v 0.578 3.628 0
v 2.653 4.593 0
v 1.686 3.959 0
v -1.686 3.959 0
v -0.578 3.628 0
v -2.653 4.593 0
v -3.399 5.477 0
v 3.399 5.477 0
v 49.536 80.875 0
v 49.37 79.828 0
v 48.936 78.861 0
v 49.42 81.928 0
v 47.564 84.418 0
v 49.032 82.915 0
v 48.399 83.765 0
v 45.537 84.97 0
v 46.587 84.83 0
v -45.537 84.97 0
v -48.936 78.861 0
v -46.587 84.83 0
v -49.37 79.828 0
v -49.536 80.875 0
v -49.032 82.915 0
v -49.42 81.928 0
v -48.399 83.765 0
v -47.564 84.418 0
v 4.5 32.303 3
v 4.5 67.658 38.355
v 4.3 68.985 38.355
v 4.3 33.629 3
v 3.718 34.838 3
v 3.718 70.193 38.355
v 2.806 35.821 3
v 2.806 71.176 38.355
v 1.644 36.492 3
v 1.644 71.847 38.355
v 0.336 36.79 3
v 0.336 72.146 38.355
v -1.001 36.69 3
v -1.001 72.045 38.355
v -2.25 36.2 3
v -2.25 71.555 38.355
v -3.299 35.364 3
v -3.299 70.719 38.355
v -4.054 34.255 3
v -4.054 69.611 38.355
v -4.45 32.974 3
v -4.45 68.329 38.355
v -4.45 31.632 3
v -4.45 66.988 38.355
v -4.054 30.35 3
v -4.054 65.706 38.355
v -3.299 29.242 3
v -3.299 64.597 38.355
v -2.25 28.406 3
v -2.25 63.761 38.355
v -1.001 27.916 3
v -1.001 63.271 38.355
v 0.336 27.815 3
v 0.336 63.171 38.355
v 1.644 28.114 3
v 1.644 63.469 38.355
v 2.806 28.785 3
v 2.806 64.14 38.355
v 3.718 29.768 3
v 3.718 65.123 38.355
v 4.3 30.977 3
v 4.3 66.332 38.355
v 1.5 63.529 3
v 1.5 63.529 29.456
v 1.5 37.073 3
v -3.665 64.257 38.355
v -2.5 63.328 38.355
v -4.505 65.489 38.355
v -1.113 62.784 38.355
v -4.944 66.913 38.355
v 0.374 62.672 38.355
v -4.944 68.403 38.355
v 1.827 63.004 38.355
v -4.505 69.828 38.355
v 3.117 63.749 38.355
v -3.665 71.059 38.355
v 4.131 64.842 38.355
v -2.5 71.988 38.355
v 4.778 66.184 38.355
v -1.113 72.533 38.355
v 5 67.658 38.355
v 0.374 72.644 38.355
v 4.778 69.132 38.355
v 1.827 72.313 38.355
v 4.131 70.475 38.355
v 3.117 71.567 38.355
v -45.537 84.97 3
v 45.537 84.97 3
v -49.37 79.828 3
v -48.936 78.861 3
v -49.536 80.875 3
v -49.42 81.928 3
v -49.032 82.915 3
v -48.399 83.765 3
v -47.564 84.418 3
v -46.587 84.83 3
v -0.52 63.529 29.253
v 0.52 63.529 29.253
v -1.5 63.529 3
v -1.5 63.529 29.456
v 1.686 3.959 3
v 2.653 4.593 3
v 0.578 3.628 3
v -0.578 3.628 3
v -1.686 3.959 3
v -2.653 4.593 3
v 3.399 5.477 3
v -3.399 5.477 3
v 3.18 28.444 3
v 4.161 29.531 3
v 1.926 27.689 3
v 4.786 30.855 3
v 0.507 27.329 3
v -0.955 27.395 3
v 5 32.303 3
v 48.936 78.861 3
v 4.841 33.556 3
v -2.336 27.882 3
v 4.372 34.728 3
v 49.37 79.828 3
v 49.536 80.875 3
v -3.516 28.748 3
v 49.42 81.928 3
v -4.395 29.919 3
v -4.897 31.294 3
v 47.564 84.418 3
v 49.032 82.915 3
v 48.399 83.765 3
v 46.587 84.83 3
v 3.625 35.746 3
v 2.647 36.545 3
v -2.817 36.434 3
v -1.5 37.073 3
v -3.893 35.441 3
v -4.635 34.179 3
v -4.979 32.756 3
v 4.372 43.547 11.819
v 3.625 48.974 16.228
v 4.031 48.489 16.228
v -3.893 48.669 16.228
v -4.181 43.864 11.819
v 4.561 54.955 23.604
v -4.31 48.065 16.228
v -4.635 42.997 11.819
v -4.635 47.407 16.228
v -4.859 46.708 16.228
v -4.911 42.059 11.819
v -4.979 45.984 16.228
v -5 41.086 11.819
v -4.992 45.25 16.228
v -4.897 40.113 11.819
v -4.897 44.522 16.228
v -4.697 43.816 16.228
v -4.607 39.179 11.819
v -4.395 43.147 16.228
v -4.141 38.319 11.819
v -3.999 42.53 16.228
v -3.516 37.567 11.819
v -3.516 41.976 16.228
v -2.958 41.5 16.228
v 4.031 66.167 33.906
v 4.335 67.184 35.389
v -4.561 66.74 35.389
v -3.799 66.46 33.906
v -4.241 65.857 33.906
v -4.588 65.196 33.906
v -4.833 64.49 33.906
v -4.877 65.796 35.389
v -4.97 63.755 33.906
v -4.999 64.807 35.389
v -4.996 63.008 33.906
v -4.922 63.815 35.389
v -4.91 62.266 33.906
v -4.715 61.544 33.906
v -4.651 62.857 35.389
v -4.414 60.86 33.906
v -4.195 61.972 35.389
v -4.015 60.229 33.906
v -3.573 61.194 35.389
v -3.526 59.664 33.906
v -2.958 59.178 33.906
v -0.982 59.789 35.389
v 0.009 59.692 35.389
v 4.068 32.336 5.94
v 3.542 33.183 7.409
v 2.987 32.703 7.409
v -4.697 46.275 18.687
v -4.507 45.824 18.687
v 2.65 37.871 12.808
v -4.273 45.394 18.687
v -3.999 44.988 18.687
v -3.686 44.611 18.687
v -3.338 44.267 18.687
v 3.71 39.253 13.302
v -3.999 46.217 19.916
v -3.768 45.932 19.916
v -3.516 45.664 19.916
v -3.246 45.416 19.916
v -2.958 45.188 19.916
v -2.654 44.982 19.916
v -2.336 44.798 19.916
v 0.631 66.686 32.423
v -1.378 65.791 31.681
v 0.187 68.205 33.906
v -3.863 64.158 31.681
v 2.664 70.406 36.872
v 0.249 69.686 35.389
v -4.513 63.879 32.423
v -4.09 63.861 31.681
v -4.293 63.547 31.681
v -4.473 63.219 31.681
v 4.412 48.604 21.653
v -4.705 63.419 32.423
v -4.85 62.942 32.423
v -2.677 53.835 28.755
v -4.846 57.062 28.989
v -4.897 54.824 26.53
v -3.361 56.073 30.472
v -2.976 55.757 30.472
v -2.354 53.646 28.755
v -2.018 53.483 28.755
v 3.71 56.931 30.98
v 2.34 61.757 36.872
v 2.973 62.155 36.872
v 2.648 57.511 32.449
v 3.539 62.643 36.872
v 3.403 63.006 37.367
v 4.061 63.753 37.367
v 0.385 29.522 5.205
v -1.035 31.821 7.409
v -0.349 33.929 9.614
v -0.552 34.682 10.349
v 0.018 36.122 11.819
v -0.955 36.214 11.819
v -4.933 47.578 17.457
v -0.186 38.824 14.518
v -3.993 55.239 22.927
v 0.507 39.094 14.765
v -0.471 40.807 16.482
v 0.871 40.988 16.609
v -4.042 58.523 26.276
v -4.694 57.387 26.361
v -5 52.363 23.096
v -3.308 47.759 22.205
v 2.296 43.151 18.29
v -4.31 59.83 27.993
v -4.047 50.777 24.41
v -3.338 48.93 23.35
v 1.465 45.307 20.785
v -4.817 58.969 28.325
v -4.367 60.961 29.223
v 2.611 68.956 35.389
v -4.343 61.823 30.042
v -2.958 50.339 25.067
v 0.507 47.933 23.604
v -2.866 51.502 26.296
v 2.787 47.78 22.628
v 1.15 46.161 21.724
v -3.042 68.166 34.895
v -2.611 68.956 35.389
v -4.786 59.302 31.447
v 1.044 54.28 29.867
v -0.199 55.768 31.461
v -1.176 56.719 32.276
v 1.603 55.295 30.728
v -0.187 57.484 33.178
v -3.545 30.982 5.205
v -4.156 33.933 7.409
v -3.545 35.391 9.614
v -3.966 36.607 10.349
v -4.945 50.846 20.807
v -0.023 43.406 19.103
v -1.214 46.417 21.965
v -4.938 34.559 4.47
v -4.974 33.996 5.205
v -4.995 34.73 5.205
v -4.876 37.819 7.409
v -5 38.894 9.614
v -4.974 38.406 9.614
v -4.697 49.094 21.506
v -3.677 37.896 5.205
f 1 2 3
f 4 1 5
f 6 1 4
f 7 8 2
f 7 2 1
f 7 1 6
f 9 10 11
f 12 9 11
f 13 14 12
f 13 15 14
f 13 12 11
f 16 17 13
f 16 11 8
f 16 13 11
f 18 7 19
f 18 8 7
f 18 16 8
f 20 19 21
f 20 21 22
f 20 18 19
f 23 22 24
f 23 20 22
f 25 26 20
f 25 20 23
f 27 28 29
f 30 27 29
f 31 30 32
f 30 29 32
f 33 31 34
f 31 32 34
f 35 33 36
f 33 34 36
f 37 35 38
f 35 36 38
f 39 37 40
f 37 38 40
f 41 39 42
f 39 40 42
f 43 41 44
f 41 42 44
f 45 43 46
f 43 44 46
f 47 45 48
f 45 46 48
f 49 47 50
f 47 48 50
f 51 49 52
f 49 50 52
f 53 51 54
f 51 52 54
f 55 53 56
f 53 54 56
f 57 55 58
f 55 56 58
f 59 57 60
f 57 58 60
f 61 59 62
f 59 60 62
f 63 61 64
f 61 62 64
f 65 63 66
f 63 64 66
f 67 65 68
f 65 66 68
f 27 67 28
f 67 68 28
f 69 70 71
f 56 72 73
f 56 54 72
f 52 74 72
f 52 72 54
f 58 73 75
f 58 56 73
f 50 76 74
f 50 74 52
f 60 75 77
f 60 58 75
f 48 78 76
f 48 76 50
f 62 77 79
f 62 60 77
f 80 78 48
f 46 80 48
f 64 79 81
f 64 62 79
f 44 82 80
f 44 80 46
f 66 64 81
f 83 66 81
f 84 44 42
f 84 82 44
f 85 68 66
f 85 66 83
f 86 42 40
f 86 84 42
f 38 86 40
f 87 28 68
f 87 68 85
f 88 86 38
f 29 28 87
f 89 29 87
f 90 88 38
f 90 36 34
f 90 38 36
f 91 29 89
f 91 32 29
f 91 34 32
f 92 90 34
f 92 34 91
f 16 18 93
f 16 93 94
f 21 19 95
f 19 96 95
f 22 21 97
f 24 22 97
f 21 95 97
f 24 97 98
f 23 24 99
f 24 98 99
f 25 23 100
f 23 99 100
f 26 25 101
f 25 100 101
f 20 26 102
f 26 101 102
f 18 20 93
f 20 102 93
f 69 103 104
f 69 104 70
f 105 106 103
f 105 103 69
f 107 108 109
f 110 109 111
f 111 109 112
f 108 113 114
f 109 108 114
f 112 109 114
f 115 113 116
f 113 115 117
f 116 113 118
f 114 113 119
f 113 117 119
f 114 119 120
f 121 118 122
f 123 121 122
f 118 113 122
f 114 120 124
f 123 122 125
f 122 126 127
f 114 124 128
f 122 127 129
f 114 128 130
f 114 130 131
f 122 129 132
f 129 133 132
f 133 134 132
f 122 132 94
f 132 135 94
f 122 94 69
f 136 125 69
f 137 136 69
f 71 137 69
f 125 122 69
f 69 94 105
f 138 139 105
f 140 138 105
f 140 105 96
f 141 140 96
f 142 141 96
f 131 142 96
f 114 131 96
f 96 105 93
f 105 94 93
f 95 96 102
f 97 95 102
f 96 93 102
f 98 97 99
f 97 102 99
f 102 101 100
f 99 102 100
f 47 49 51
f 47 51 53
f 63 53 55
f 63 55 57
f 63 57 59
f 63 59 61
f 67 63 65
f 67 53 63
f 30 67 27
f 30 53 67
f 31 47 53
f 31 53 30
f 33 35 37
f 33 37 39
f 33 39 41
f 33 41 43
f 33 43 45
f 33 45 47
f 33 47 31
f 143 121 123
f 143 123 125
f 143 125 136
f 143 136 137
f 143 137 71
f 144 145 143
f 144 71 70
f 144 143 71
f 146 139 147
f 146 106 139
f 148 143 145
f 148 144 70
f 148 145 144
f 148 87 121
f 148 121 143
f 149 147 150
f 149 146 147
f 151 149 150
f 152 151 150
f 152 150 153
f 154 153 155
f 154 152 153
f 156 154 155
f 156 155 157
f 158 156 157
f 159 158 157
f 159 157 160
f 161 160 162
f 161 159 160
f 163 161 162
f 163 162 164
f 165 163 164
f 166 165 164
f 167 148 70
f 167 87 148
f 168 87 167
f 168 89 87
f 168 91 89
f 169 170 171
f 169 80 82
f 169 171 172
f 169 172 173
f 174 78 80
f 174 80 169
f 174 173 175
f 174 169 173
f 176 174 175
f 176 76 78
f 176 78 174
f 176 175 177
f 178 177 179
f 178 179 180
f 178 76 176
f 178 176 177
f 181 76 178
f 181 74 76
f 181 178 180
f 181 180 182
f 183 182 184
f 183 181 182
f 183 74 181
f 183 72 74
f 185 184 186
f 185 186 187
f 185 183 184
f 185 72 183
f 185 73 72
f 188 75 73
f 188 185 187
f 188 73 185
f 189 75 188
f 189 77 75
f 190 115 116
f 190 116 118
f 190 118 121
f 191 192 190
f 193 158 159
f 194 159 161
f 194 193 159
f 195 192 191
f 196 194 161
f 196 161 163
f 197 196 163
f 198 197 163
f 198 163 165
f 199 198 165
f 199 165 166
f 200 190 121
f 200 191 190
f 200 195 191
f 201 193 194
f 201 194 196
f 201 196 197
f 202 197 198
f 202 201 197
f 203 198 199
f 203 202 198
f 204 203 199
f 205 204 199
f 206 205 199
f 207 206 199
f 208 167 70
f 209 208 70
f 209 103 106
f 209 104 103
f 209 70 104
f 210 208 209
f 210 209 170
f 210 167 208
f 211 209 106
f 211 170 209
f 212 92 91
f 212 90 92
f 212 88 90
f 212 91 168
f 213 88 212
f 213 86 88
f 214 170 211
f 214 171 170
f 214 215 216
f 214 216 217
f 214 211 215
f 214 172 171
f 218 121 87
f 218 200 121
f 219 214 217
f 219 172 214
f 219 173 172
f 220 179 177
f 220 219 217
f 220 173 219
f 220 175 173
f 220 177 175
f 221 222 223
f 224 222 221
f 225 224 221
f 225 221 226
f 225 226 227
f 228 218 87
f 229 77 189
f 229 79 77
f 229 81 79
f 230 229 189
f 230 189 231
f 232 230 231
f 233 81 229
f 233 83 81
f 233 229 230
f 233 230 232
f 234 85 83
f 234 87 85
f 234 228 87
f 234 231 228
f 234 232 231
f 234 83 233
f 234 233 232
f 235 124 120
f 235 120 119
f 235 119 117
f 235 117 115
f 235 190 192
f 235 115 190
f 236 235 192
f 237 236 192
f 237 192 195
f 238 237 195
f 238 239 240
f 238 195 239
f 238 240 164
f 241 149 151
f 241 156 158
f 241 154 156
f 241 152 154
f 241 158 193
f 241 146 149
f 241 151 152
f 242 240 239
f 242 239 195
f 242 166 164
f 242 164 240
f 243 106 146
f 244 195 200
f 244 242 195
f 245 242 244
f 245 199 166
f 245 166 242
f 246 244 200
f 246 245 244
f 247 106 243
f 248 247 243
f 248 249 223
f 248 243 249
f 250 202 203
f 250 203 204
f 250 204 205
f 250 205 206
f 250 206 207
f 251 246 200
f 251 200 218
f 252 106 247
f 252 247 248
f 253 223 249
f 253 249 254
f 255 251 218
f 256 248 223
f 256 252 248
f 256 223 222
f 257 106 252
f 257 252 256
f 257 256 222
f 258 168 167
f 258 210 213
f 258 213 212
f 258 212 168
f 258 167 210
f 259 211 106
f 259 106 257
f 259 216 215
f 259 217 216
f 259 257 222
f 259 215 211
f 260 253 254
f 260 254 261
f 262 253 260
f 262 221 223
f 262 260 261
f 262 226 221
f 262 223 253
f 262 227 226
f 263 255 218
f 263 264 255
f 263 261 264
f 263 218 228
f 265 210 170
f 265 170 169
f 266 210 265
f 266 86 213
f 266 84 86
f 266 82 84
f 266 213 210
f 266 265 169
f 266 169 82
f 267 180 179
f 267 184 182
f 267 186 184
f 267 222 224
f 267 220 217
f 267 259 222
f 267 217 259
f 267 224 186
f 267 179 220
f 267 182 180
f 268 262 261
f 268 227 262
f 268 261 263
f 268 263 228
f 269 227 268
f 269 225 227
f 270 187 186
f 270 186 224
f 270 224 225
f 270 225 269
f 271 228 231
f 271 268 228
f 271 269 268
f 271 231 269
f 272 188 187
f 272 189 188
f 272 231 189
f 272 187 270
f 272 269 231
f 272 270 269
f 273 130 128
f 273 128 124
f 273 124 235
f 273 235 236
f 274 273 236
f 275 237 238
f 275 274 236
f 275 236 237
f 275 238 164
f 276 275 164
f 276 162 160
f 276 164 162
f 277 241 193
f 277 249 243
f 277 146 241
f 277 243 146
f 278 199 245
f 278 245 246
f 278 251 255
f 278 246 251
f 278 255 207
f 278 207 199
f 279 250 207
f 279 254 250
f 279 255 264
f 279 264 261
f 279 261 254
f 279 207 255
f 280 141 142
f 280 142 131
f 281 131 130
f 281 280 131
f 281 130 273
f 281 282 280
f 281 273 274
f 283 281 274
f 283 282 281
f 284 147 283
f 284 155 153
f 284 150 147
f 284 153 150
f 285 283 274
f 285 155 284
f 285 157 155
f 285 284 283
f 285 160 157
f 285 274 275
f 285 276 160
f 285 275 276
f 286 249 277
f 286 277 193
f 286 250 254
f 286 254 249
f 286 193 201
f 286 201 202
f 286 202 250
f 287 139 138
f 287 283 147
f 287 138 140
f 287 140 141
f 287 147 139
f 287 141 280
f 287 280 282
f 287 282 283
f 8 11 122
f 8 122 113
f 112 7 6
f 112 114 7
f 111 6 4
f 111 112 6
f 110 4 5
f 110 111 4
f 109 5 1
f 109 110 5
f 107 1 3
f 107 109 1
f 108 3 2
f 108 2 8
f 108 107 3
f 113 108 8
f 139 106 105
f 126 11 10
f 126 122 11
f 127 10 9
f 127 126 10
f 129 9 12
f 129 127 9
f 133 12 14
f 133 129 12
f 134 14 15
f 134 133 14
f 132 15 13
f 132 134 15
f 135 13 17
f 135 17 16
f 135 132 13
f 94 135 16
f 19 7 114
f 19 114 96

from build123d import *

# Parameters (mm, degrees)
BOSS_EXTRU_1_DEPTH = 3
ESQUISSE5_R        = 5
ESQUISSE7_R        = 4.5
NERVURE4_REACH     = 109.103
ESQUISSE10_WALL_W  = 242.432835572
ESQUISSE10_WALL_H  = 3
CONG_1_R           = 4


with BuildPart() as part:
    # Esquisse1 → Boss.-Extru.1 (new body)
    with BuildSketch(Plane.XY):
        Polygon((0, 0), (-52.726441393, 84.970126386), (52.726441393, 84.970126386), align=None)
    extrude(amount=BOSS_EXTRU_1_DEPTH)

    # Balayage1: sweep along a path in Esquisse6
    with BuildLine(Plane(origin=(0, 0, 0), x_dir=(0, 0, -1), z_dir=(1, 0, 0))) as balayage1_path:
        Line((-3, 32.30290769), (-38.355339059, 67.65824675))
    # Esquisse5 → Balayage1 (sweep)
    with BuildSketch(Plane.XY.offset(3)):
        with Locations((0, 32.30290769)):
            Circle(ESQUISSE5_R)
    sweep(path=balayage1_path.line)

    # Enlèvement de matière-Balayage1: sweep along a path in Esquisse6<2>
    with BuildLine(Plane(origin=(0, 0, 0), x_dir=(0, 0, -1), z_dir=(1, 0, 0))) as enl_vement_de_mati_re_balayage1_path:
        Line((-3, 32.30290769), (-38.355339059, 67.65824675))
    # Esquisse7 → Enlèvement de matière-Balayage1 (sweep, cut)
    with BuildSketch(Plane.XY.offset(3)):
        with Locations((0, 32.30290769)):
            Circle(ESQUISSE7_R)
    sweep(path=enl_vement_de_mati_re_balayage1_path.line, mode=Mode.SUBTRACT)

    # Esquisse10 wall → Nervure4 (add, up to next)
    with BuildSketch(Plane(origin=(0, 63.529001685, 16.113046997), x_dir=(0, 0, -1), z_dir=(0, 1, 0)), mode=Mode.PRIVATE) as nervure4_sk1:
        Rectangle(ESQUISSE10_WALL_W, ESQUISSE10_WALL_H)
    nervure4_tool1 = extrude(nervure4_sk1.sketch, amount=-NERVURE4_REACH, mode=Mode.PRIVATE) - part.part
    add(nervure4_tool1.solids().sort_by_distance((0, 63.529001685, 16.113046997))[0])

    # Congé1
    cong_1_edges = [part.edges().sort_by_distance(p)[0] for p in [
        (0, 0, 1.5),
        (-52.726441393, 84.970126386, 1.5),
        (52.726441393, 84.970126386, 1.5),
    ]]
    fillet(cong_1_edges, radius=CONG_1_R)


solid = part.part
